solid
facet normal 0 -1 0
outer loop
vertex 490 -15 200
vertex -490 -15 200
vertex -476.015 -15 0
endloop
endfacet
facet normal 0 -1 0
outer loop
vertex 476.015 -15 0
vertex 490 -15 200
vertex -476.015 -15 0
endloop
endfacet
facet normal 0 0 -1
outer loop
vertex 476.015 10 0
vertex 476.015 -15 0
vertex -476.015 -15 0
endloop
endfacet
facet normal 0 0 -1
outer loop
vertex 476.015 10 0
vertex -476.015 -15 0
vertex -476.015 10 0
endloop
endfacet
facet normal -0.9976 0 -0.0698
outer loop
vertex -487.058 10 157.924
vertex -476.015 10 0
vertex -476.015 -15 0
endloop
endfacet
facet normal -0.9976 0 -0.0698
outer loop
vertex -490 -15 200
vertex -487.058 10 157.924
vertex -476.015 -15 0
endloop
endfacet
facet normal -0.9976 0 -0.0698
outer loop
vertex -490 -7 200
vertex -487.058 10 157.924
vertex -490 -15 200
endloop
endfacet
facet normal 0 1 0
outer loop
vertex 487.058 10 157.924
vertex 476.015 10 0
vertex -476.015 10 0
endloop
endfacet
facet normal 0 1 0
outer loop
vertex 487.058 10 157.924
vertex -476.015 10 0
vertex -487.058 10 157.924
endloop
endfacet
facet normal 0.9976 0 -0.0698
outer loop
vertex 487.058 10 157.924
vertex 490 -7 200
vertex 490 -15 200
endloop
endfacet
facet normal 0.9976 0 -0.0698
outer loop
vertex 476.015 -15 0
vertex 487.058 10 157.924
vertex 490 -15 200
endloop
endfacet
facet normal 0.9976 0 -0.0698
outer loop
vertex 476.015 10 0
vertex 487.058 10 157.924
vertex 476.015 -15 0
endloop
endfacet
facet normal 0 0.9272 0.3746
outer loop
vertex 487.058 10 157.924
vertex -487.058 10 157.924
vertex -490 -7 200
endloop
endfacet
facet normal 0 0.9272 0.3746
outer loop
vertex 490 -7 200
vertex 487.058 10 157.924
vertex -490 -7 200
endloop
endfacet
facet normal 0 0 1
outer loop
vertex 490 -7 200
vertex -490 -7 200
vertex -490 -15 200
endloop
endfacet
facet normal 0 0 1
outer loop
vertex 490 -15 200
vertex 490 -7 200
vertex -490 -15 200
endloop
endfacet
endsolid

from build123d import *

# Parameters (mm, degrees)
EXTRUDE1_DEPTH          = 490
CUT_EXTRUDE1_DEPTH      = 11
CUT_EXTRUDE1_DEPTH_BACK = 16
CUT_EXTRUDE2_DEPTH      = 11
CUT_EXTRUDE2_DEPTH_BACK = 16


with BuildPart() as part:
    # Sketch1 → Extrude1 (new body, symmetric)
    with BuildSketch(Plane(origin=(0, 0, 0), x_dir=(0, 0, -1), z_dir=(1, 0, 0))):
        Polygon((-200, -7), (-200, -15), (0, -15), (0, 10), (-157.923523492, 10), align=None)
    extrude(amount=EXTRUDE1_DEPTH, both=True)

    # Sketch2 → Cut-Extrude1 (cut, two sides)
    with BuildSketch(Plane(origin=(0, 0, 0), x_dir=(1, 0, 0), z_dir=(0, 1, 0))) as cut_extrude1_sk:
        Polygon((-335.776225586, 2005.502726748), (-476.014637611, 0), (-490, -200), (-630.238412025, -2205.502726748), (-4641.243865521, -1925.025902697), (-4346.781679081, 2285.979550799), align=None)
    extrude(amount=CUT_EXTRUDE1_DEPTH, mode=Mode.SUBTRACT)
    extrude(cut_extrude1_sk.sketch, amount=-CUT_EXTRUDE1_DEPTH_BACK, mode=Mode.SUBTRACT)

    # Sketch3 → Cut-Extrude2 (cut, two sides)
    with BuildSketch(Plane(origin=(0, 0, 0), x_dir=(1, 0, 0), z_dir=(0, 1, 0))) as cut_extrude2_sk:
        Polygon((630.238412025, -2205.502726748), (490, -200), (476.014637611, 0), (335.776225586, 2005.502726748), (4346.781679081, 2285.979550799), (4641.243865521, -1925.025902697), align=None)
    extrude(amount=CUT_EXTRUDE2_DEPTH, mode=Mode.SUBTRACT)
    extrude(cut_extrude2_sk.sketch, amount=-CUT_EXTRUDE2_DEPTH_BACK, mode=Mode.SUBTRACT)


solid = part.part
